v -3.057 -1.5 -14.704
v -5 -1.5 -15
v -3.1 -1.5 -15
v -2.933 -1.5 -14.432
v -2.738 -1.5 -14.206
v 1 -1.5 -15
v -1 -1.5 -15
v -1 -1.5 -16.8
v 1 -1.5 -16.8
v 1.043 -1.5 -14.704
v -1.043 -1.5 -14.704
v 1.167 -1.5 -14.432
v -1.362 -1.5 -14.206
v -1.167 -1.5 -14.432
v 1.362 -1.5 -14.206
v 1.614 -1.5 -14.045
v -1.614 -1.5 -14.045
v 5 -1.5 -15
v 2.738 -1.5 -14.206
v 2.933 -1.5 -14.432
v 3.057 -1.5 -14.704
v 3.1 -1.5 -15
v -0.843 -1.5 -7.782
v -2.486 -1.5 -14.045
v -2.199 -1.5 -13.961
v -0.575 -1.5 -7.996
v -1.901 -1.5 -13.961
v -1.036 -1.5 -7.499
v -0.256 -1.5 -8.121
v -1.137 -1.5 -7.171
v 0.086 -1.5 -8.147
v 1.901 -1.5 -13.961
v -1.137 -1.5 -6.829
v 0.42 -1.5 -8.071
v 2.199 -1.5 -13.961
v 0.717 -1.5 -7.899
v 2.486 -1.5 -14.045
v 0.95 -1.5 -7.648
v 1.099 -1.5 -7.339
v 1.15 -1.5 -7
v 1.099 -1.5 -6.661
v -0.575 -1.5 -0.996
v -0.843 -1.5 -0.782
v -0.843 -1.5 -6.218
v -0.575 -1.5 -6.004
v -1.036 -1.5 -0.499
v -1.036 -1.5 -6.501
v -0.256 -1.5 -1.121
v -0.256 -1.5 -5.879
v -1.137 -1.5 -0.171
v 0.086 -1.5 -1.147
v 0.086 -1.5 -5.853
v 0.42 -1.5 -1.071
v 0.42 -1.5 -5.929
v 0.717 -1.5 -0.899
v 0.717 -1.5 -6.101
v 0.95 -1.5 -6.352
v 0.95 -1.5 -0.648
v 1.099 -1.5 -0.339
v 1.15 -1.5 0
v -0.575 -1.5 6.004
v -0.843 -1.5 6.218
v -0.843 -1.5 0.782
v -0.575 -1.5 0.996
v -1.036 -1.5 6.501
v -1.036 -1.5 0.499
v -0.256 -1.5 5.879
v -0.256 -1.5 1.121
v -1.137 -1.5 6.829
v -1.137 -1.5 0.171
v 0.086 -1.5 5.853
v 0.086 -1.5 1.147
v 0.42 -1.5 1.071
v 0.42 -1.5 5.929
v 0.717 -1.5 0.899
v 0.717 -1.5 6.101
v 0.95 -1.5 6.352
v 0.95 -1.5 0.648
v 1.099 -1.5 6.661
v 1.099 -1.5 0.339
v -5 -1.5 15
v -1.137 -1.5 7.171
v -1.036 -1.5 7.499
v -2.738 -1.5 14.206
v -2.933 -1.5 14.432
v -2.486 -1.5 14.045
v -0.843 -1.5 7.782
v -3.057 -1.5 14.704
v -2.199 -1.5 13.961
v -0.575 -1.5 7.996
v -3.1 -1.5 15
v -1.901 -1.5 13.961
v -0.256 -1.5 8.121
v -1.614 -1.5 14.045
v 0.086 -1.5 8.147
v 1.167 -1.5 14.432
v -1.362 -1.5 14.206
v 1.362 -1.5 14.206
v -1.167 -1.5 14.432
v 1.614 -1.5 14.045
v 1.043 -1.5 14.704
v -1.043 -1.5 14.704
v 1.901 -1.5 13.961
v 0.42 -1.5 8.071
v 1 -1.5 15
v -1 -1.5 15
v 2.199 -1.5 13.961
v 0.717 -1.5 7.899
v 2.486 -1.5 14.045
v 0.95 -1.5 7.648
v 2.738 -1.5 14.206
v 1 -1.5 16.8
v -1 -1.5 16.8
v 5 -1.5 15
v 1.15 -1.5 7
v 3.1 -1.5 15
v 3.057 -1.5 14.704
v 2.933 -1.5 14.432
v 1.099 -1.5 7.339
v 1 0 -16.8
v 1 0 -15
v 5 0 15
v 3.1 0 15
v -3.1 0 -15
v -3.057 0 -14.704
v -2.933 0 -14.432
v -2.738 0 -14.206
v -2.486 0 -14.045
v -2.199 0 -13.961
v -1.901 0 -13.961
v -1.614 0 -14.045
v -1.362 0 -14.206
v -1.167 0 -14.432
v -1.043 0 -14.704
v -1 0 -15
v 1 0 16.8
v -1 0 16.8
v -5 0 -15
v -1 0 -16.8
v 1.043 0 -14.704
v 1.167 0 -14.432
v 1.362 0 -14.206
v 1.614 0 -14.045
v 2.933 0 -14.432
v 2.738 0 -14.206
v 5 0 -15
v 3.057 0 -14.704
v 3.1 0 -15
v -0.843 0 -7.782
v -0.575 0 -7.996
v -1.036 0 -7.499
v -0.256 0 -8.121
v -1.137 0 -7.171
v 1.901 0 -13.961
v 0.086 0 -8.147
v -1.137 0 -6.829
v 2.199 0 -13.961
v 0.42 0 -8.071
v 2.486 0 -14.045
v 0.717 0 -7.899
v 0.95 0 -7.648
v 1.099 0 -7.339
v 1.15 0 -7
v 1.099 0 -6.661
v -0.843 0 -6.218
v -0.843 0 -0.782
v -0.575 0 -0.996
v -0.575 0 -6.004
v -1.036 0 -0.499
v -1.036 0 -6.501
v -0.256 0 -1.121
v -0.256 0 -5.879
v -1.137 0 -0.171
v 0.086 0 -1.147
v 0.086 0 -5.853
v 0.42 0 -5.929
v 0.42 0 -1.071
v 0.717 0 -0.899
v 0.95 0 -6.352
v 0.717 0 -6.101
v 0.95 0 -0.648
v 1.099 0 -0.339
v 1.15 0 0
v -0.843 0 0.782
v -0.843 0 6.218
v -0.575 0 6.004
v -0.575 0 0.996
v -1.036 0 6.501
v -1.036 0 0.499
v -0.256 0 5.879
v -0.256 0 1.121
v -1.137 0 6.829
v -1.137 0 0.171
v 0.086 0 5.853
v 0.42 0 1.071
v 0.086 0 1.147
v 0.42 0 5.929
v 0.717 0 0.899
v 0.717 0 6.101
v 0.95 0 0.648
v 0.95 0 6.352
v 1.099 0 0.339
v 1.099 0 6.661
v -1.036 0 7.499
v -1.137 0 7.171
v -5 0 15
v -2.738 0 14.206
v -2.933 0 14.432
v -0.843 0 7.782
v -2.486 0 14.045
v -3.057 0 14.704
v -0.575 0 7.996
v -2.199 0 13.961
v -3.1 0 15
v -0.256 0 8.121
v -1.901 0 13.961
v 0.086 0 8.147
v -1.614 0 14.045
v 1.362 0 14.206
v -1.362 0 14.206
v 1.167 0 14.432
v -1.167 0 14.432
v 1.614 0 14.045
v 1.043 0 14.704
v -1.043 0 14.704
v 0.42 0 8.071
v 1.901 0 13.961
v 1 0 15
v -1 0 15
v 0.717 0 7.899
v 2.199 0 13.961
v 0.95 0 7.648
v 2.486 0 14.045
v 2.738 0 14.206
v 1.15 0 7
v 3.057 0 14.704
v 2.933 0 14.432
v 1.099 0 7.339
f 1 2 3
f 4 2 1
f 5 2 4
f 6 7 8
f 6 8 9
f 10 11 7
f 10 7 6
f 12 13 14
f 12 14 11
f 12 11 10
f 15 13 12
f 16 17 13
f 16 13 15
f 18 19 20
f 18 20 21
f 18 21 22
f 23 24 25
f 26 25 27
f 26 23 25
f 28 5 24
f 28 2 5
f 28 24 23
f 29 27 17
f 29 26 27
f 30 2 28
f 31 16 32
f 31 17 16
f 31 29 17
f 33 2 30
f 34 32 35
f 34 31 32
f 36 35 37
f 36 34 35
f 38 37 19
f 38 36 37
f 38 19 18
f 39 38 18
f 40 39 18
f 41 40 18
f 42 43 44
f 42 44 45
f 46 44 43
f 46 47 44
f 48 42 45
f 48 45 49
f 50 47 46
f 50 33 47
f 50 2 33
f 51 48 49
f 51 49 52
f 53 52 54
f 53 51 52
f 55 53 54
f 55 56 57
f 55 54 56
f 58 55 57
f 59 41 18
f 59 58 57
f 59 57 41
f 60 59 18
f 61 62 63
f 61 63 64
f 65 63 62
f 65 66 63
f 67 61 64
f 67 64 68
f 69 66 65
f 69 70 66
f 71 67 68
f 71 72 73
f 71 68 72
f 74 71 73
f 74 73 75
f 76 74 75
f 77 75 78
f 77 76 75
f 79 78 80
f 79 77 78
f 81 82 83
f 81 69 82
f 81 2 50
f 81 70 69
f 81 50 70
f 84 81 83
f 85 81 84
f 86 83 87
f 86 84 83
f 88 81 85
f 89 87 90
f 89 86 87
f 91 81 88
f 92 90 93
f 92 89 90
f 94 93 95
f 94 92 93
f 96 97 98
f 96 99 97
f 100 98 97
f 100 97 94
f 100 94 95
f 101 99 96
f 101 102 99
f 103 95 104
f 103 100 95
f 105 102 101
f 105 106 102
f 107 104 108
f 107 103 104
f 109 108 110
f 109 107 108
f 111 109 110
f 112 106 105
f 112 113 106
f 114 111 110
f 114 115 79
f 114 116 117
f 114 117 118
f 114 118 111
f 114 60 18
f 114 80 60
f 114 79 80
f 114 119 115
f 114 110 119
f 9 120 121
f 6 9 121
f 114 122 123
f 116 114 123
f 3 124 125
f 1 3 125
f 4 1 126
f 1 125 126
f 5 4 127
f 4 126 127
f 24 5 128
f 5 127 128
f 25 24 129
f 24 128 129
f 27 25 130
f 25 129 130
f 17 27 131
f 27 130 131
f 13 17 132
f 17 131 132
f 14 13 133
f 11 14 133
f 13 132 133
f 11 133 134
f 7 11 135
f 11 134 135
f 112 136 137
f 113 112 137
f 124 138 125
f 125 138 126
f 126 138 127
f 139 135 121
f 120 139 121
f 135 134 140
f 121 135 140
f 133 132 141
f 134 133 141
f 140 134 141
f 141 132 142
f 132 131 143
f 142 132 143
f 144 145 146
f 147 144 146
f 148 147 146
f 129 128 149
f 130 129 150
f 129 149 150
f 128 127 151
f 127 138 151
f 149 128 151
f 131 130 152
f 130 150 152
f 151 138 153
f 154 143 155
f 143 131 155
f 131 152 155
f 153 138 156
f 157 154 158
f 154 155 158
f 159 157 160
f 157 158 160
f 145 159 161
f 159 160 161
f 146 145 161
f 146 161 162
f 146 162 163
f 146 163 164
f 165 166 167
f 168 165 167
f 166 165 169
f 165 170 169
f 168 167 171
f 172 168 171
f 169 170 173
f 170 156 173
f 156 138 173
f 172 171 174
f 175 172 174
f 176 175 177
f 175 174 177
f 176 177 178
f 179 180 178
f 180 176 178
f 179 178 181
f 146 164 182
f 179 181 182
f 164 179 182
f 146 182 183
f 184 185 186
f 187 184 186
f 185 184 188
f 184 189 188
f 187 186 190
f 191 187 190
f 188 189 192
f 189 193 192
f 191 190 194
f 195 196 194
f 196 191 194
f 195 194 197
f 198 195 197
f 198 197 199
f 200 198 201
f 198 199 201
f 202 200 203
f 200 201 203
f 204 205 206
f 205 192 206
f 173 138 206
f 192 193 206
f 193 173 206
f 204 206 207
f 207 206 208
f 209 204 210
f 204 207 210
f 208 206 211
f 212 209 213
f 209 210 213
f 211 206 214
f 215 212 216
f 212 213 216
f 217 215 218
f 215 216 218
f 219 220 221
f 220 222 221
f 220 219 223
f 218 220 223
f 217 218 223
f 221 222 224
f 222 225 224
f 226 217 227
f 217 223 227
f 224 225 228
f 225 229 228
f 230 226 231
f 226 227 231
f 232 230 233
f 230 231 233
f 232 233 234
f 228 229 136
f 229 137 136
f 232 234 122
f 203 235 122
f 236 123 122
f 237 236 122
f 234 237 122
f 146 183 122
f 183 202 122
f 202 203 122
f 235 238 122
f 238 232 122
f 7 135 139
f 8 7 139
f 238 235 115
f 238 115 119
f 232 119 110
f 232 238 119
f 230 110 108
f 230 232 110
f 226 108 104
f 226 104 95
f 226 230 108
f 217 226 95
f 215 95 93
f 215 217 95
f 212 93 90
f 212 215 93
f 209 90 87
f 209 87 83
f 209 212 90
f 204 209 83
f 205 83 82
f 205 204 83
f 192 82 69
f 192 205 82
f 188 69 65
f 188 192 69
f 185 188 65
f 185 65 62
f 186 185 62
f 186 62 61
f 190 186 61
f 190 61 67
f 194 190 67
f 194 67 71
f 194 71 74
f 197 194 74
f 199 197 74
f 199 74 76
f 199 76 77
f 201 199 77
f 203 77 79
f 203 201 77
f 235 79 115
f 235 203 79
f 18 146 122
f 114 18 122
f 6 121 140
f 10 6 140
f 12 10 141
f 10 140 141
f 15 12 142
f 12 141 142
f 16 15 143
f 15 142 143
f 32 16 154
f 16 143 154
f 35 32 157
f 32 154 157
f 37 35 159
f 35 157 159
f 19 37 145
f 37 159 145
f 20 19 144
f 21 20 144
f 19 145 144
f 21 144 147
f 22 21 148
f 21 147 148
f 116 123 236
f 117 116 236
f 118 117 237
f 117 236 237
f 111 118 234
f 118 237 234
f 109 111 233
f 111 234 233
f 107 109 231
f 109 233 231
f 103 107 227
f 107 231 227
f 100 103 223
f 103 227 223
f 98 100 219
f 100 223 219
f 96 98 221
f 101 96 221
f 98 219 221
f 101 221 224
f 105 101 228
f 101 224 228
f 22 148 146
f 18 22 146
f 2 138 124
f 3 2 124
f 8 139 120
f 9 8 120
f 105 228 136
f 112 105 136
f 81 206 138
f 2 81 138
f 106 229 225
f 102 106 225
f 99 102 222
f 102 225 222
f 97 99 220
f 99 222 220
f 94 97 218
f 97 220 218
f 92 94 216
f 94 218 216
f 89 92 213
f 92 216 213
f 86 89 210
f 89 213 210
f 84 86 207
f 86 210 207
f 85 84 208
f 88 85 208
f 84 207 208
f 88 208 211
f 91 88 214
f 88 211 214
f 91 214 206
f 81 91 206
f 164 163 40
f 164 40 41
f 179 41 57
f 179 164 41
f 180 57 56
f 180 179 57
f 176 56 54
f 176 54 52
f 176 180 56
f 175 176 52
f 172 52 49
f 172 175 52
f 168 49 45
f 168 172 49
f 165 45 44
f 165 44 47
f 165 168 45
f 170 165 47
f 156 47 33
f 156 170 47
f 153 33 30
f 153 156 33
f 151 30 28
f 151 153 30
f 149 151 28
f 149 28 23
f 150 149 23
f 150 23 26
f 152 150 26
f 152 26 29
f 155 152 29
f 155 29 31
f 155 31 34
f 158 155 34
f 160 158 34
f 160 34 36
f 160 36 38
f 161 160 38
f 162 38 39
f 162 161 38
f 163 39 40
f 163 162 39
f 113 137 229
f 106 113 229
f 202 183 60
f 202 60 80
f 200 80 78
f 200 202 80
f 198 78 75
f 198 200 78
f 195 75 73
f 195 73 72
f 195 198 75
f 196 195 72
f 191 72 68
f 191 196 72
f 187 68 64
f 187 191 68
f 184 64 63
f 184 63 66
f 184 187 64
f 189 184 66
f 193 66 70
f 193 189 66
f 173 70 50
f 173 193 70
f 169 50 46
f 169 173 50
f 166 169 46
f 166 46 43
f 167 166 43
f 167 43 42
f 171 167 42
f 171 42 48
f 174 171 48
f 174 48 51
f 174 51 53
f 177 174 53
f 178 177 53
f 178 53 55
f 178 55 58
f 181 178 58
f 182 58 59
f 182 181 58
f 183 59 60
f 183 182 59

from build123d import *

# Parameters (mm, degrees)
F0_R     = 1.15
F1_DEPTH = 1.5


with BuildPart() as f1:
    # F0 (on Front) → F1 (new body)
    with BuildSketch(Plane.XZ):
        with BuildLine():
            Line((-5, 15), (-5, 0))
            Line((-5, 0), (-5, -15))
            Line((-5, -15), (-3.1, -15))
            ThreePointArc((-3.1, -15), (-2.05, -13.95), (-1, -15))
            Line((-1, -15), (-1, -16.8))
            Line((-1, -16.8), (0, -16.8))
            Line((0, -16.8), (1, -16.8))
            Line((1, -16.8), (1, -15))
            ThreePointArc((1, -15), (2.05, -13.95), (3.1, -15))
            Line((3.1, -15), (5, -15))
            Line((5, -15), (5, 0))
            Line((5, 0), (5, 15))
            Line((5, 15), (3.1, 15))
            ThreePointArc((3.1, 15), (2.05, 13.95), (1, 15))
            Line((1, 15), (1, 16.8))
            Line((1, 16.8), (0, 16.8))
            Line((0, 16.8), (-1, 16.8))
            Line((-1, 16.8), (-1, 15))
            ThreePointArc((-1, 15), (-2.05, 13.95), (-3.1, 15))
            Line((-3.1, 15), (-5, 15))
        make_face()
        with Locations((0, -7)):
            Circle(F0_R, mode=Mode.SUBTRACT)
        Circle(F0_R, mode=Mode.SUBTRACT)
        with Locations((0, 7)):
            Circle(F0_R, mode=Mode.SUBTRACT)
    extrude(amount=F1_DEPTH)


solid = f1.part
